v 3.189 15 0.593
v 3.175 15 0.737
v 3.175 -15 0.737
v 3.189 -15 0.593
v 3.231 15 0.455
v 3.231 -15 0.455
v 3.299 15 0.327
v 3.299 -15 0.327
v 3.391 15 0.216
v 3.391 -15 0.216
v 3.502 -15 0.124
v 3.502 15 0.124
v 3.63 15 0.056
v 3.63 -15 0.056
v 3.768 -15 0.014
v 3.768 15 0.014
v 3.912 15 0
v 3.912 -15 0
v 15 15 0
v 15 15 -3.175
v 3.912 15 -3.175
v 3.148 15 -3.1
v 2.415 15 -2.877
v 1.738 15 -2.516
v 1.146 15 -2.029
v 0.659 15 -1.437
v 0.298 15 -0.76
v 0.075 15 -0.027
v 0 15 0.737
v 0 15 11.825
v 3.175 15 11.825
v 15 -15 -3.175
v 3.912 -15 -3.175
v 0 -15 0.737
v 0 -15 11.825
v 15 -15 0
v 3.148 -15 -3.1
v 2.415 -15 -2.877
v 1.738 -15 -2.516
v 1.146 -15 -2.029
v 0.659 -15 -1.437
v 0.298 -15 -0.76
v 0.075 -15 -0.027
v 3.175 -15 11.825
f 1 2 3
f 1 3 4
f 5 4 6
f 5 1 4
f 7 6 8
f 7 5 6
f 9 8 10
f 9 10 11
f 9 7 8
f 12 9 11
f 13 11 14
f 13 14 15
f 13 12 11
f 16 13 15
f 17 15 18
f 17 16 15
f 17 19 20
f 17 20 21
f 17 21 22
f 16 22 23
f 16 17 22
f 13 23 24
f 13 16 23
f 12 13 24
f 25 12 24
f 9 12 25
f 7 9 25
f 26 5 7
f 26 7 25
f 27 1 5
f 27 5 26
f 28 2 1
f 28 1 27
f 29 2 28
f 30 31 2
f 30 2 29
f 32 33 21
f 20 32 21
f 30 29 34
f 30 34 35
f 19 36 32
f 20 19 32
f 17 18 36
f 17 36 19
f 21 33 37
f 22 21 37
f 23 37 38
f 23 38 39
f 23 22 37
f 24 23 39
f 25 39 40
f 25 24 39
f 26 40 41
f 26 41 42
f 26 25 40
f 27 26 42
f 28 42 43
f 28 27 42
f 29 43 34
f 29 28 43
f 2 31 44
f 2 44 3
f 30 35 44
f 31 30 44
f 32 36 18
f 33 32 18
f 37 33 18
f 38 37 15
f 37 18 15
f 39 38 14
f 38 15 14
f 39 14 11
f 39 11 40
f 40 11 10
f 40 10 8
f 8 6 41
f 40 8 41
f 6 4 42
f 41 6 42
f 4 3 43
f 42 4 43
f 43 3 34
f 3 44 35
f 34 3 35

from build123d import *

# Parameters (mm, degrees)
SKETCH1_W                    = 3.175
SKETCH1_H                    = 30
BASE_FLANGE1_DEPTH           = 15
EDGE_FLANGE1_STRIP_W         = 14.1732
EDGE_FLANGE1_STRIP_H         = 3.175
EDGE_FLANGE1_STRIP_CUT_DEPTH = 30
EDGE_FLANGE1_DEPTH           = 30


# Sheet-metal steps are written as plain solids
with BuildPart() as part:
    # Sketch1 → Base-Flange1 (new body)
    with BuildSketch(Plane(origin=(0, 0, 0), x_dir=(0, 0, -1), z_dir=(1, 0, 0))):
        with Locations((1.5875, 0)):
            Rectangle(SKETCH1_W, SKETCH1_H)
    extrude(amount=BASE_FLANGE1_DEPTH)

    # Edge-Flange1 strip (across the edge) → Edge-Flange1 strip cut (cut)
    with BuildSketch(Plane.XZ.offset(-15)):
        with Locations((-3.175, -1.5875)):
            Rectangle(EDGE_FLANGE1_STRIP_W, EDGE_FLANGE1_STRIP_H)
    extrude(amount=EDGE_FLANGE1_STRIP_CUT_DEPTH, mode=Mode.SUBTRACT)

    # Edge-Flange1 section (across the edge) → Edge-Flange1 (add)
    with BuildSketch(Plane.XZ.offset(-15)):
        with BuildLine():
            Line((0, 0.7366), (0, 11.825))
            Line((0, 11.825), (3.175, 11.825))
            Line((3.175, 11.825), (3.175, 0.7366))
            ThreePointArc((3.175, 0.7366), (3.390745145, 0.215745145), (3.9116, 0))
            Line((3.9116, 0), (3.9116, -3.175))
            ThreePointArc((3.9116, -3.175), (1.145681115, -2.029318885), (0, 0.7366))
        make_face()
    extrude(amount=EDGE_FLANGE1_DEPTH)


solid = part.part
